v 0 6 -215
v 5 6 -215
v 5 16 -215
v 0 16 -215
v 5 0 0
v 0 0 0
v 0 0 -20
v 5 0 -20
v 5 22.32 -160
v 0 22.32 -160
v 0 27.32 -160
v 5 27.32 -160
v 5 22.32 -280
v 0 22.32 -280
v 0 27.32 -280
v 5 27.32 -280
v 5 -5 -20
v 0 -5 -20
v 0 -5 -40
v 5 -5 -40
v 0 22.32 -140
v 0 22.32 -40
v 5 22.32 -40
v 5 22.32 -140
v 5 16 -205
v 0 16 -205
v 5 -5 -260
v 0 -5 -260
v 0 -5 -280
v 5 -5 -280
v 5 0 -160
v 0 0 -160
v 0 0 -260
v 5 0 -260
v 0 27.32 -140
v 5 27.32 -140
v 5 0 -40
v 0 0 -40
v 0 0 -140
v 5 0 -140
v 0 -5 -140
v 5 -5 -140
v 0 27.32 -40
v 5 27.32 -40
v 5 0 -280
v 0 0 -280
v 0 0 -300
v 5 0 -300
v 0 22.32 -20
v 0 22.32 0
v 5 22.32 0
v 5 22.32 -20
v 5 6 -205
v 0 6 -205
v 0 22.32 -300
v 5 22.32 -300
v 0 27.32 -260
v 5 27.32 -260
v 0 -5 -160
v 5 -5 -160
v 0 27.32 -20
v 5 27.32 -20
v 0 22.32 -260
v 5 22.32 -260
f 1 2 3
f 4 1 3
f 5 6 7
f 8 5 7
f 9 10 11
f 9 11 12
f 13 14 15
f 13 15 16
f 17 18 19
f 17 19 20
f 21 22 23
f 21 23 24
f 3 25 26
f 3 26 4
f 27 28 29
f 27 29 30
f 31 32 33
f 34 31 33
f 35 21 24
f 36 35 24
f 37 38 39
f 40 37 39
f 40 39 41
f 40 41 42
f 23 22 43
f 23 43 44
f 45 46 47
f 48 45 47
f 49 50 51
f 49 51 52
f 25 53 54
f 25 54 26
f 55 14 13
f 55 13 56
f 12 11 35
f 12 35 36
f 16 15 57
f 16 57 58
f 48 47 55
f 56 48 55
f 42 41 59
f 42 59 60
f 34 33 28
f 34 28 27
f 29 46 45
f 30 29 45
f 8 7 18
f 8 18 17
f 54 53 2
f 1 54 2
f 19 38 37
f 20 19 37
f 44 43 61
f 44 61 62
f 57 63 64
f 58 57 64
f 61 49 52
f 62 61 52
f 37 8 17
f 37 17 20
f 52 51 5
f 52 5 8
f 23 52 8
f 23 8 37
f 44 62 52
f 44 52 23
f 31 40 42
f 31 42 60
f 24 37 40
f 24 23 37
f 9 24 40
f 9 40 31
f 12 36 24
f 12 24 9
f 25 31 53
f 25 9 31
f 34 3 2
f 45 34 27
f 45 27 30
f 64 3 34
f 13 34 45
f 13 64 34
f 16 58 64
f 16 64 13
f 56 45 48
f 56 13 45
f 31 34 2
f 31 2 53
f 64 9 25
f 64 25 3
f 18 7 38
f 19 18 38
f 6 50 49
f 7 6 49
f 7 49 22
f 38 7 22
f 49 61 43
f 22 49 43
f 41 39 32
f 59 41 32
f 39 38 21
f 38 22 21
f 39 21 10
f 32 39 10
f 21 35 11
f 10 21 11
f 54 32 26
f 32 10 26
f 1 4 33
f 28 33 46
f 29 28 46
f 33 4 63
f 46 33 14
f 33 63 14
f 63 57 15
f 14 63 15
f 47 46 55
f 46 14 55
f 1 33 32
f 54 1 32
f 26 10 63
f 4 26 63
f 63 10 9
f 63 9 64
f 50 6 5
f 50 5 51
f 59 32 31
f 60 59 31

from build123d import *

# Parameters (mm, degrees)
SKETCH1_W           = 300
SKETCH1_H           = 22.32
BOSS_EXTRUDE1_DEPTH = 5
SKETCH2_W           = 5
SKETCH2_H           = 20
BOSS_EXTRUDE2_DEPTH = 5
SKETCH3_W           = 5
SKETCH3_H           = 20
BOSS_EXTRUDE3_DEPTH = 5
SKETCH4_W           = 10
SKETCH4_H           = 10
CUT_EXTRUDE1_DEPTH  = 5


with BuildPart() as part:
    # Sketch1 → Boss-Extrude1 (new body)
    with BuildSketch(Plane(origin=(0, 0, 0), x_dir=(0, 0, -1), z_dir=(1, 0, 0))):
        with Locations((150, 11.16)):
            Rectangle(SKETCH1_W, SKETCH1_H)
    extrude(amount=BOSS_EXTRUDE1_DEPTH)

    # Sketch2 → Boss-Extrude2 (add)
    with BuildSketch(Plane(origin=(0, 22.32, 0), x_dir=(1, 0, 0), z_dir=(0, 1, 0))):
        with Locations((2.5, 30)):
            Rectangle(SKETCH2_W, SKETCH2_H)
        with Locations((2.5, 270)):
            Rectangle(SKETCH2_W, SKETCH2_H)
        with Locations((2.5, 150)):
            Rectangle(SKETCH2_W, SKETCH2_H)
    extrude(amount=BOSS_EXTRUDE2_DEPTH)

    # Sketch3 → Boss-Extrude3 (add)
    with BuildSketch(Plane.XZ):
        with Locations((2.5, -30)):
            Rectangle(SKETCH3_W, SKETCH3_H)
        with Locations((2.5, -150)):
            Rectangle(SKETCH3_W, SKETCH3_H)
        with Locations((2.5, -270)):
            Rectangle(SKETCH3_W, SKETCH3_H)
    extrude(amount=BOSS_EXTRUDE3_DEPTH)

    # Sketch4 → Cut-Extrude1 (cut)
    with BuildSketch(Plane(origin=(5, 0, 0), x_dir=(0, 0, -1), z_dir=(1, 0, 0))):
        with Locations((210, 11)):
            Rectangle(SKETCH4_W, SKETCH4_H)
    extrude(amount=-CUT_EXTRUDE1_DEPTH, mode=Mode.SUBTRACT)


solid = part.part
